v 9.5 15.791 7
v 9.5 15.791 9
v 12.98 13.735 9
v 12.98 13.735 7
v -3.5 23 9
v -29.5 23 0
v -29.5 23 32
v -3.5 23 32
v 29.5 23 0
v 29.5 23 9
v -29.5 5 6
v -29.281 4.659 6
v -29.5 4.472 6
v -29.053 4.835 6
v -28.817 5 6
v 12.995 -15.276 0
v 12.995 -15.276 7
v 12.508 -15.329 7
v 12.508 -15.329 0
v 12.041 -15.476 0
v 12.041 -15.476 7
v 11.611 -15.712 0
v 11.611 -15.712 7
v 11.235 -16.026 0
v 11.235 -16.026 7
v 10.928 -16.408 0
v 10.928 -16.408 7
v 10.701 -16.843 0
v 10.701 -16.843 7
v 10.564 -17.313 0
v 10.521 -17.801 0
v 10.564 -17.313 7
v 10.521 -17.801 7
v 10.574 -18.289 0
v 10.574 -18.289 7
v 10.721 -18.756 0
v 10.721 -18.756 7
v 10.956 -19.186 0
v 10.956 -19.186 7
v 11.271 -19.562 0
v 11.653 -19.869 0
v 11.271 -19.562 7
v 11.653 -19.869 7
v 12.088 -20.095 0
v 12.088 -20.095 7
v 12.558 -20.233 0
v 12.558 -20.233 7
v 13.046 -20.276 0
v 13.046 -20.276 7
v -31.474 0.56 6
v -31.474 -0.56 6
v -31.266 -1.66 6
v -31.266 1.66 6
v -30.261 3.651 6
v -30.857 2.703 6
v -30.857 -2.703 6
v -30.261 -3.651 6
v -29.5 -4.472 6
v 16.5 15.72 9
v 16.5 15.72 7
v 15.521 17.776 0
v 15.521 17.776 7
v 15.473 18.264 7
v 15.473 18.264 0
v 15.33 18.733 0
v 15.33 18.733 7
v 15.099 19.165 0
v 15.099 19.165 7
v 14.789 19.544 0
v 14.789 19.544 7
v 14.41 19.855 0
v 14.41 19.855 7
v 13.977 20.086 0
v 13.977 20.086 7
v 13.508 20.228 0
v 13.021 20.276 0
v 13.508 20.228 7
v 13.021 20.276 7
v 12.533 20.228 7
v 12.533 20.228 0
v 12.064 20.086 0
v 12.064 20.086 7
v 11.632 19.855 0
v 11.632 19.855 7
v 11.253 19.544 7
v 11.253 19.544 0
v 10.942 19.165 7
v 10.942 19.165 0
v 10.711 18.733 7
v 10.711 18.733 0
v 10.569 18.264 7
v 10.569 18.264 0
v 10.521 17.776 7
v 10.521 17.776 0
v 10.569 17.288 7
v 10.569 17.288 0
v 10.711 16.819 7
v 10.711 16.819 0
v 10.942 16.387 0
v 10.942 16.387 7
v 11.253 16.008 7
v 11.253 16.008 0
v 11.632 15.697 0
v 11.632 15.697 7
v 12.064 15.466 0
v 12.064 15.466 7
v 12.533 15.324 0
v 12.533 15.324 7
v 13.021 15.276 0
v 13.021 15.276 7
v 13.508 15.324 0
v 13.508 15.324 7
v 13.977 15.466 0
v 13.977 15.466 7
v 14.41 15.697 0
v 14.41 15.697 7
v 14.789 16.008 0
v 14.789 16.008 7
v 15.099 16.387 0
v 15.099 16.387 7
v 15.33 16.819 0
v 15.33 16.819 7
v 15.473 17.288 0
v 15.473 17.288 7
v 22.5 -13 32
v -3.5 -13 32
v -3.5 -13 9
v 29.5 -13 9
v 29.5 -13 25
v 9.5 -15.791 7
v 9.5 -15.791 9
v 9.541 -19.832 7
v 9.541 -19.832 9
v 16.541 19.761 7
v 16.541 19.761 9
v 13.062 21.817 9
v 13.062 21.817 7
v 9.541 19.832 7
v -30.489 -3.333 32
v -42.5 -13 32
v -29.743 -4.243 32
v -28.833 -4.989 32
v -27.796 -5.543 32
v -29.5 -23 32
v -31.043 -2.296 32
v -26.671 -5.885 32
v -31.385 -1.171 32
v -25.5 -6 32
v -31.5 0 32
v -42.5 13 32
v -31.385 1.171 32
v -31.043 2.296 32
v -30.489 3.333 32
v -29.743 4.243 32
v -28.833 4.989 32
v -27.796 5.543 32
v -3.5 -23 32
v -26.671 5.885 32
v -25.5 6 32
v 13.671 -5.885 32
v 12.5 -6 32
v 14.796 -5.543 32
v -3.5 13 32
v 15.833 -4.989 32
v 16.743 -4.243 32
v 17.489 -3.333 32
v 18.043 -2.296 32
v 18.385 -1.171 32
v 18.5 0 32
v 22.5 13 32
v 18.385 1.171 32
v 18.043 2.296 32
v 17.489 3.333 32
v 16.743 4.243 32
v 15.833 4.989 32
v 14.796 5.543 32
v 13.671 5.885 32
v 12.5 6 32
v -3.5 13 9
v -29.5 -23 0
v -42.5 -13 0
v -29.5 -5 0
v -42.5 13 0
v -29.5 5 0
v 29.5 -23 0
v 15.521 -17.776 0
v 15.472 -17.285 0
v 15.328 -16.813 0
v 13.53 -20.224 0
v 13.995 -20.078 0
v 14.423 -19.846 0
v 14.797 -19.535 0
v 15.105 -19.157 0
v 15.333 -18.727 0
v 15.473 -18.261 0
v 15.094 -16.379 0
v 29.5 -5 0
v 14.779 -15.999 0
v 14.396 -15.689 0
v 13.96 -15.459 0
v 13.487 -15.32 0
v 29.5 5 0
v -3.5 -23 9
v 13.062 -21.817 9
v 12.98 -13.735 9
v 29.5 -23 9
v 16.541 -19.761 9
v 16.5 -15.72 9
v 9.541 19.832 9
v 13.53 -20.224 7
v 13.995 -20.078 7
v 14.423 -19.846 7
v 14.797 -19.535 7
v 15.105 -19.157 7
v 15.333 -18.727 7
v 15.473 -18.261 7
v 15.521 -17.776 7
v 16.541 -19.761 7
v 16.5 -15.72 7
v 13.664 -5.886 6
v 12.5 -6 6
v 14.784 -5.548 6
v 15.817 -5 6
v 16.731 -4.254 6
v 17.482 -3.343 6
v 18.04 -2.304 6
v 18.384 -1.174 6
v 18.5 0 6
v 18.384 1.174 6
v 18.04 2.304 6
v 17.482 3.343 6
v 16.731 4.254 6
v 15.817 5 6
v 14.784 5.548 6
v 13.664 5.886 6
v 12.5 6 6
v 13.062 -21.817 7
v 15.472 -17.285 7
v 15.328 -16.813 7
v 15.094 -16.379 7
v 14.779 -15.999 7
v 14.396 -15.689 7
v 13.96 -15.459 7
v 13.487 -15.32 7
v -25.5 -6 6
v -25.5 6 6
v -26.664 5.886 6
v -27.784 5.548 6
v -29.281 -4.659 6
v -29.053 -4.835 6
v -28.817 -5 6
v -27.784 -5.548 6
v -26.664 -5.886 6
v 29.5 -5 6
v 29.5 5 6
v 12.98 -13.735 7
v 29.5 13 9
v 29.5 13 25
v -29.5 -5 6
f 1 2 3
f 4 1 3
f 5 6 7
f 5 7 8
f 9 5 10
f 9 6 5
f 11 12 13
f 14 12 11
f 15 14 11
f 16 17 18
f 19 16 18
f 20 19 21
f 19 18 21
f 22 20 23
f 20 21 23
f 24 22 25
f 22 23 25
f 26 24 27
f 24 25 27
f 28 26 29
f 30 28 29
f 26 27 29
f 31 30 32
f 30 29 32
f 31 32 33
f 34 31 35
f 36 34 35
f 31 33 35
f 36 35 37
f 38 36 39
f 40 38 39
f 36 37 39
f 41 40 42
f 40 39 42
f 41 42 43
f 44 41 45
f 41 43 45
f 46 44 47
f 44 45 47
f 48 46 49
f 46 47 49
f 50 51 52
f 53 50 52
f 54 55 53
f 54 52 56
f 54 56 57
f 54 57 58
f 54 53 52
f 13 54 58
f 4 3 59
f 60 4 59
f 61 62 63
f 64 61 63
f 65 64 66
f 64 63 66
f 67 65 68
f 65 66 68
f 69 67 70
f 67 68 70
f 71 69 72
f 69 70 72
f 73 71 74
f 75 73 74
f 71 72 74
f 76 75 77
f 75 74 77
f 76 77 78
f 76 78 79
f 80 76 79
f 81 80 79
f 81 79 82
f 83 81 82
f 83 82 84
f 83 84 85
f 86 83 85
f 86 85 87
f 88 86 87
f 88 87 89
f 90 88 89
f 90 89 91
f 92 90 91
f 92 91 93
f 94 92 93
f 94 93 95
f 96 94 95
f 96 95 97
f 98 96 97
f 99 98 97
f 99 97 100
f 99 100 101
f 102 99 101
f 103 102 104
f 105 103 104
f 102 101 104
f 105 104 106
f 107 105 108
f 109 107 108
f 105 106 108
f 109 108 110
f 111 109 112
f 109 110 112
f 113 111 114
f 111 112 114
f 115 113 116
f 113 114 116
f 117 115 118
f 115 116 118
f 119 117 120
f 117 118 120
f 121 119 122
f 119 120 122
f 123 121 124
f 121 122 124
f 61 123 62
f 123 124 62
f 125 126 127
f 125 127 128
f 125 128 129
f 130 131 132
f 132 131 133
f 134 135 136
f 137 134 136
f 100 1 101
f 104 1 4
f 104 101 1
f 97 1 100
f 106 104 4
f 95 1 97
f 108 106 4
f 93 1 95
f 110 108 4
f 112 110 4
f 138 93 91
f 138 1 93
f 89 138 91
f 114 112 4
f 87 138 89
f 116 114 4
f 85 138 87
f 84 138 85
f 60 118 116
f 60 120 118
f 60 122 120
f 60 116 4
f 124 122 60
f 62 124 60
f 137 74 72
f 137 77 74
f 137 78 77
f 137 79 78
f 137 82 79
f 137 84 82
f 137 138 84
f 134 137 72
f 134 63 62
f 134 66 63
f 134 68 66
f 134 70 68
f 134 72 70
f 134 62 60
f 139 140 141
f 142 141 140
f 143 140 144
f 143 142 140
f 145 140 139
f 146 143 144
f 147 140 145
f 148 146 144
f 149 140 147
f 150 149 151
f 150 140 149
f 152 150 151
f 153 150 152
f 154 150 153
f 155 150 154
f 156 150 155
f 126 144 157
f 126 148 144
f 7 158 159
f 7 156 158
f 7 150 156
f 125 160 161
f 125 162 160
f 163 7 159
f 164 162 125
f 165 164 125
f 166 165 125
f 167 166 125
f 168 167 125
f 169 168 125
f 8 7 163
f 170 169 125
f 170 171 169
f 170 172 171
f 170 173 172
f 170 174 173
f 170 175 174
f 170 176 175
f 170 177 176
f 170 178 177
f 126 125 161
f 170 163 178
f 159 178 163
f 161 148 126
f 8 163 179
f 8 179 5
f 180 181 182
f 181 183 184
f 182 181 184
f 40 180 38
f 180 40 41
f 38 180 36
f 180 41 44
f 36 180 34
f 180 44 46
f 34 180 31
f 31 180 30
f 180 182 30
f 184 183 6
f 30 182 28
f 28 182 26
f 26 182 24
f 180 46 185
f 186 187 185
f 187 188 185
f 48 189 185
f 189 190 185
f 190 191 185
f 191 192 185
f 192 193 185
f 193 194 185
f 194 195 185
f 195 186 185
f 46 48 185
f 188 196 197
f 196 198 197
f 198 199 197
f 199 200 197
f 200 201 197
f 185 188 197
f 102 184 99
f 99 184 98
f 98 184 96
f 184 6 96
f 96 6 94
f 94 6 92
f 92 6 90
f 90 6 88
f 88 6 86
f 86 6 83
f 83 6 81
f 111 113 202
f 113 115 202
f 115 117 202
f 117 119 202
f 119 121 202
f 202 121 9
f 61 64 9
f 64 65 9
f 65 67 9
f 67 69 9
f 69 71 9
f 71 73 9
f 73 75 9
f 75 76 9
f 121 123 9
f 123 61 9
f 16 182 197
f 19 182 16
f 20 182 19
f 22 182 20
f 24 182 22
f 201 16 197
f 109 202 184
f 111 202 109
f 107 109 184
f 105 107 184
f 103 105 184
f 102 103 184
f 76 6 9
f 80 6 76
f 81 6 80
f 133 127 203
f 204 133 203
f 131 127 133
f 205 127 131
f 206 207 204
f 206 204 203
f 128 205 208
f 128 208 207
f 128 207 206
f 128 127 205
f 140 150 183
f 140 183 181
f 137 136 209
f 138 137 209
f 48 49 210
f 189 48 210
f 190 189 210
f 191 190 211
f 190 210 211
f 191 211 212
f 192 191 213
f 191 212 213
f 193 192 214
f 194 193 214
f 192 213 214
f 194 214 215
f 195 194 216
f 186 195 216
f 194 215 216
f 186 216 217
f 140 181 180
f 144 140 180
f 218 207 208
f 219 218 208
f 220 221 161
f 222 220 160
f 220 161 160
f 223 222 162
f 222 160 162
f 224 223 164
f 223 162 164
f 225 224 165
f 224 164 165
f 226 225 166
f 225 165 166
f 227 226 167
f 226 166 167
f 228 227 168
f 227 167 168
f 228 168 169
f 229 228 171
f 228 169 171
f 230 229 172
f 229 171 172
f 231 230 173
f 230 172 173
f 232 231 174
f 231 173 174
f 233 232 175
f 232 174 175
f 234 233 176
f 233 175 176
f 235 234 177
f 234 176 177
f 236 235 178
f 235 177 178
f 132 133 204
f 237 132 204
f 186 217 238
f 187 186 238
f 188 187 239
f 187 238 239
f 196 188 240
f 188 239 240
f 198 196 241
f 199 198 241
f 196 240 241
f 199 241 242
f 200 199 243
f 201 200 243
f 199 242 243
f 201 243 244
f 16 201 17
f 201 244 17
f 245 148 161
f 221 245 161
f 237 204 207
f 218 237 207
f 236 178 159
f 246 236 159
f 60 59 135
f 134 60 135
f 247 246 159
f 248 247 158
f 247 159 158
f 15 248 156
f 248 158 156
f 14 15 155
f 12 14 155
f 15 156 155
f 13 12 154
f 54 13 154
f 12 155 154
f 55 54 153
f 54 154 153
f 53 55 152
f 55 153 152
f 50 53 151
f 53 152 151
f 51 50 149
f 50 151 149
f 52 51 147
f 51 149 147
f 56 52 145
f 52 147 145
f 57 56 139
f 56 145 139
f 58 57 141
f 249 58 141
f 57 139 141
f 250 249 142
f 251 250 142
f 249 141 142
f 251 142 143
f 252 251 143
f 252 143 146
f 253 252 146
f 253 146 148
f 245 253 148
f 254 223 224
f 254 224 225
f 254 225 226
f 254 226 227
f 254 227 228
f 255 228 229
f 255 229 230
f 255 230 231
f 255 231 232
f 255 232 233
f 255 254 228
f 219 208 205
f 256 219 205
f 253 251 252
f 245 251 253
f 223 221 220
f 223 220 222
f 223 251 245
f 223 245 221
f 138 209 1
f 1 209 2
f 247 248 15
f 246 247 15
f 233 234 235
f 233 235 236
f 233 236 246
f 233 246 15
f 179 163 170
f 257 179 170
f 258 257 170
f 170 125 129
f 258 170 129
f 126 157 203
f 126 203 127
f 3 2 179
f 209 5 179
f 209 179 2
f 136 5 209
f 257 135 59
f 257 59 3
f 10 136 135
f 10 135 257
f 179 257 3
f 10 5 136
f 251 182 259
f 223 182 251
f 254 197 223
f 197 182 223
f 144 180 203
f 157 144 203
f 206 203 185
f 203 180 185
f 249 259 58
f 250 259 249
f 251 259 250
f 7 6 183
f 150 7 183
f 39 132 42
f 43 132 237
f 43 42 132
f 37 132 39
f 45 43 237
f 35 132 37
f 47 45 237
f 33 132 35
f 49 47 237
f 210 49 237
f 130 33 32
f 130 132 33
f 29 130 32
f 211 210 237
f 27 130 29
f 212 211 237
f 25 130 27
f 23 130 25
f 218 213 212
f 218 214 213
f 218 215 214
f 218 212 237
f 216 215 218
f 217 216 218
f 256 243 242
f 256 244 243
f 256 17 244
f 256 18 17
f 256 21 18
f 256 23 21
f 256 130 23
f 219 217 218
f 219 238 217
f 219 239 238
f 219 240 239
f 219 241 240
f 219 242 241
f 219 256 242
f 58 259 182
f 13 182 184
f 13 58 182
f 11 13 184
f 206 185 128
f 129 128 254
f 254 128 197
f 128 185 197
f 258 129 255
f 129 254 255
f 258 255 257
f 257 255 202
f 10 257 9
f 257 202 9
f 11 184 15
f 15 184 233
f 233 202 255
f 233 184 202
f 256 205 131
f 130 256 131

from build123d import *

# Parameters (mm, degrees)
F0_W      = 59
F0_H      = 46
F1_DEPTH  = 32
F2_W      = 10
F2_H      = 6
F3_DEPTH  = 59
F4_W      = 33
F4_H      = 10
F5_DEPTH  = 23
F6_DEPTH  = 32
F8_DEPTH  = 26
F9_W      = 16
F9_H      = 12
F9_W_2    = 22
F10_DEPTH = 26
F12_DEPTH = 2
F13_R     = 2.5
F14_DEPTH = 25


with BuildPart() as f1:
    # F0 (on Top) → F1 (new body)
    with BuildSketch(Plane.XY):
        Rectangle(F0_W, F0_H)
    extrude(amount=F1_DEPTH)

    # F2 (on face) → F3 (cut)
    with BuildSketch(Plane.YZ.offset(29.5)):
        with Locations((0, 3)):
            Rectangle(F2_W, F2_H)
    extrude(amount=-F3_DEPTH, mode=Mode.SUBTRACT)

    # F4 (on face) → F5 (cut)
    with BuildSketch(Plane.XY.offset(32)):
        with Locations((13, -18)):
            Rectangle(F4_W, F4_H)
        with Locations((13, 18)):
            Rectangle(F4_W, F4_H)
    extrude(amount=-F5_DEPTH, mode=Mode.SUBTRACT)

    # F4 (on face) → F6 (join)
    with BuildSketch(Plane.XY.offset(32)):
        Polygon((-42.5, -13), (-29.5, -23), (-29.5, 23), (-42.5, 13), align=None)
    extrude(amount=-F6_DEPTH)

    # F7 (on face) → F8 (cut)
    with BuildSketch(Plane.XZ.offset(13)):
        Polygon((29.5, 25), (29.5, 32), (22.5, 32), align=None)
    extrude(amount=-F8_DEPTH, mode=Mode.SUBTRACT)

    # F9 (on face) → F10 (cut)
    with BuildSketch(Plane.XY.offset(32)):
        with Locations((4.5, 0)):
            Rectangle(F9_W, F9_H)
        with Locations((-14.5, 0)):
            Rectangle(F9_W_2, F9_H)
        with BuildLine():
            ThreePointArc((12.5, -6), (18.5, 0), (12.5, 6))
            Line((12.5, 6), (12.5, -6))
        make_face()
        with BuildLine():
            Line((-25.5, -6), (-25.5, 6))
            ThreePointArc((-25.5, 6), (-31.5, 0), (-25.5, -6))
        make_face()
    extrude(amount=-F10_DEPTH, mode=Mode.SUBTRACT)

    # F11 (on face) → F12 (cut)
    with BuildSketch(Plane.XY.offset(9)):
        Polygon((16.5, -15.719817), (12.979622, -13.734805), (9.500362, -15.791036), (9.54148, -19.832278), (13.061858, -21.817291), (16.541118, -19.76106), align=None)
        Polygon((13.061858, 21.817291), (9.54148, 19.832278), (9.500362, 15.791036), (12.979622, 13.734805), (16.5, 15.719817), (16.541118, 19.76106), align=None)
    extrude(amount=-F12_DEPTH, mode=Mode.SUBTRACT)

    # F13 (on face) → F14 (cut)
    with BuildSketch(Plane.XY.offset(7)):
        with BuildLine():
            ThreePointArc((15.52074, -17.776048), (14.779491, -15.999311), (12.995305, -15.276177))
            Line((12.995305, -15.276177), (13.046175, -20.275918))
            ThreePointArc((13.046175, -20.275918), (14.797477, -19.534799), (15.52074, -17.776048))
        make_face()
        with BuildLine():
            Line((13.046175, -20.275918), (12.995305, -15.276177))
            ThreePointArc((12.995305, -15.276177), (10.52087, -17.801483), (13.046175, -20.275918))
        make_face()
        with Locations((13.02074, 17.776048)):
            Circle(F13_R)
    extrude(amount=-F14_DEPTH, mode=Mode.SUBTRACT)


solid = f1.part
